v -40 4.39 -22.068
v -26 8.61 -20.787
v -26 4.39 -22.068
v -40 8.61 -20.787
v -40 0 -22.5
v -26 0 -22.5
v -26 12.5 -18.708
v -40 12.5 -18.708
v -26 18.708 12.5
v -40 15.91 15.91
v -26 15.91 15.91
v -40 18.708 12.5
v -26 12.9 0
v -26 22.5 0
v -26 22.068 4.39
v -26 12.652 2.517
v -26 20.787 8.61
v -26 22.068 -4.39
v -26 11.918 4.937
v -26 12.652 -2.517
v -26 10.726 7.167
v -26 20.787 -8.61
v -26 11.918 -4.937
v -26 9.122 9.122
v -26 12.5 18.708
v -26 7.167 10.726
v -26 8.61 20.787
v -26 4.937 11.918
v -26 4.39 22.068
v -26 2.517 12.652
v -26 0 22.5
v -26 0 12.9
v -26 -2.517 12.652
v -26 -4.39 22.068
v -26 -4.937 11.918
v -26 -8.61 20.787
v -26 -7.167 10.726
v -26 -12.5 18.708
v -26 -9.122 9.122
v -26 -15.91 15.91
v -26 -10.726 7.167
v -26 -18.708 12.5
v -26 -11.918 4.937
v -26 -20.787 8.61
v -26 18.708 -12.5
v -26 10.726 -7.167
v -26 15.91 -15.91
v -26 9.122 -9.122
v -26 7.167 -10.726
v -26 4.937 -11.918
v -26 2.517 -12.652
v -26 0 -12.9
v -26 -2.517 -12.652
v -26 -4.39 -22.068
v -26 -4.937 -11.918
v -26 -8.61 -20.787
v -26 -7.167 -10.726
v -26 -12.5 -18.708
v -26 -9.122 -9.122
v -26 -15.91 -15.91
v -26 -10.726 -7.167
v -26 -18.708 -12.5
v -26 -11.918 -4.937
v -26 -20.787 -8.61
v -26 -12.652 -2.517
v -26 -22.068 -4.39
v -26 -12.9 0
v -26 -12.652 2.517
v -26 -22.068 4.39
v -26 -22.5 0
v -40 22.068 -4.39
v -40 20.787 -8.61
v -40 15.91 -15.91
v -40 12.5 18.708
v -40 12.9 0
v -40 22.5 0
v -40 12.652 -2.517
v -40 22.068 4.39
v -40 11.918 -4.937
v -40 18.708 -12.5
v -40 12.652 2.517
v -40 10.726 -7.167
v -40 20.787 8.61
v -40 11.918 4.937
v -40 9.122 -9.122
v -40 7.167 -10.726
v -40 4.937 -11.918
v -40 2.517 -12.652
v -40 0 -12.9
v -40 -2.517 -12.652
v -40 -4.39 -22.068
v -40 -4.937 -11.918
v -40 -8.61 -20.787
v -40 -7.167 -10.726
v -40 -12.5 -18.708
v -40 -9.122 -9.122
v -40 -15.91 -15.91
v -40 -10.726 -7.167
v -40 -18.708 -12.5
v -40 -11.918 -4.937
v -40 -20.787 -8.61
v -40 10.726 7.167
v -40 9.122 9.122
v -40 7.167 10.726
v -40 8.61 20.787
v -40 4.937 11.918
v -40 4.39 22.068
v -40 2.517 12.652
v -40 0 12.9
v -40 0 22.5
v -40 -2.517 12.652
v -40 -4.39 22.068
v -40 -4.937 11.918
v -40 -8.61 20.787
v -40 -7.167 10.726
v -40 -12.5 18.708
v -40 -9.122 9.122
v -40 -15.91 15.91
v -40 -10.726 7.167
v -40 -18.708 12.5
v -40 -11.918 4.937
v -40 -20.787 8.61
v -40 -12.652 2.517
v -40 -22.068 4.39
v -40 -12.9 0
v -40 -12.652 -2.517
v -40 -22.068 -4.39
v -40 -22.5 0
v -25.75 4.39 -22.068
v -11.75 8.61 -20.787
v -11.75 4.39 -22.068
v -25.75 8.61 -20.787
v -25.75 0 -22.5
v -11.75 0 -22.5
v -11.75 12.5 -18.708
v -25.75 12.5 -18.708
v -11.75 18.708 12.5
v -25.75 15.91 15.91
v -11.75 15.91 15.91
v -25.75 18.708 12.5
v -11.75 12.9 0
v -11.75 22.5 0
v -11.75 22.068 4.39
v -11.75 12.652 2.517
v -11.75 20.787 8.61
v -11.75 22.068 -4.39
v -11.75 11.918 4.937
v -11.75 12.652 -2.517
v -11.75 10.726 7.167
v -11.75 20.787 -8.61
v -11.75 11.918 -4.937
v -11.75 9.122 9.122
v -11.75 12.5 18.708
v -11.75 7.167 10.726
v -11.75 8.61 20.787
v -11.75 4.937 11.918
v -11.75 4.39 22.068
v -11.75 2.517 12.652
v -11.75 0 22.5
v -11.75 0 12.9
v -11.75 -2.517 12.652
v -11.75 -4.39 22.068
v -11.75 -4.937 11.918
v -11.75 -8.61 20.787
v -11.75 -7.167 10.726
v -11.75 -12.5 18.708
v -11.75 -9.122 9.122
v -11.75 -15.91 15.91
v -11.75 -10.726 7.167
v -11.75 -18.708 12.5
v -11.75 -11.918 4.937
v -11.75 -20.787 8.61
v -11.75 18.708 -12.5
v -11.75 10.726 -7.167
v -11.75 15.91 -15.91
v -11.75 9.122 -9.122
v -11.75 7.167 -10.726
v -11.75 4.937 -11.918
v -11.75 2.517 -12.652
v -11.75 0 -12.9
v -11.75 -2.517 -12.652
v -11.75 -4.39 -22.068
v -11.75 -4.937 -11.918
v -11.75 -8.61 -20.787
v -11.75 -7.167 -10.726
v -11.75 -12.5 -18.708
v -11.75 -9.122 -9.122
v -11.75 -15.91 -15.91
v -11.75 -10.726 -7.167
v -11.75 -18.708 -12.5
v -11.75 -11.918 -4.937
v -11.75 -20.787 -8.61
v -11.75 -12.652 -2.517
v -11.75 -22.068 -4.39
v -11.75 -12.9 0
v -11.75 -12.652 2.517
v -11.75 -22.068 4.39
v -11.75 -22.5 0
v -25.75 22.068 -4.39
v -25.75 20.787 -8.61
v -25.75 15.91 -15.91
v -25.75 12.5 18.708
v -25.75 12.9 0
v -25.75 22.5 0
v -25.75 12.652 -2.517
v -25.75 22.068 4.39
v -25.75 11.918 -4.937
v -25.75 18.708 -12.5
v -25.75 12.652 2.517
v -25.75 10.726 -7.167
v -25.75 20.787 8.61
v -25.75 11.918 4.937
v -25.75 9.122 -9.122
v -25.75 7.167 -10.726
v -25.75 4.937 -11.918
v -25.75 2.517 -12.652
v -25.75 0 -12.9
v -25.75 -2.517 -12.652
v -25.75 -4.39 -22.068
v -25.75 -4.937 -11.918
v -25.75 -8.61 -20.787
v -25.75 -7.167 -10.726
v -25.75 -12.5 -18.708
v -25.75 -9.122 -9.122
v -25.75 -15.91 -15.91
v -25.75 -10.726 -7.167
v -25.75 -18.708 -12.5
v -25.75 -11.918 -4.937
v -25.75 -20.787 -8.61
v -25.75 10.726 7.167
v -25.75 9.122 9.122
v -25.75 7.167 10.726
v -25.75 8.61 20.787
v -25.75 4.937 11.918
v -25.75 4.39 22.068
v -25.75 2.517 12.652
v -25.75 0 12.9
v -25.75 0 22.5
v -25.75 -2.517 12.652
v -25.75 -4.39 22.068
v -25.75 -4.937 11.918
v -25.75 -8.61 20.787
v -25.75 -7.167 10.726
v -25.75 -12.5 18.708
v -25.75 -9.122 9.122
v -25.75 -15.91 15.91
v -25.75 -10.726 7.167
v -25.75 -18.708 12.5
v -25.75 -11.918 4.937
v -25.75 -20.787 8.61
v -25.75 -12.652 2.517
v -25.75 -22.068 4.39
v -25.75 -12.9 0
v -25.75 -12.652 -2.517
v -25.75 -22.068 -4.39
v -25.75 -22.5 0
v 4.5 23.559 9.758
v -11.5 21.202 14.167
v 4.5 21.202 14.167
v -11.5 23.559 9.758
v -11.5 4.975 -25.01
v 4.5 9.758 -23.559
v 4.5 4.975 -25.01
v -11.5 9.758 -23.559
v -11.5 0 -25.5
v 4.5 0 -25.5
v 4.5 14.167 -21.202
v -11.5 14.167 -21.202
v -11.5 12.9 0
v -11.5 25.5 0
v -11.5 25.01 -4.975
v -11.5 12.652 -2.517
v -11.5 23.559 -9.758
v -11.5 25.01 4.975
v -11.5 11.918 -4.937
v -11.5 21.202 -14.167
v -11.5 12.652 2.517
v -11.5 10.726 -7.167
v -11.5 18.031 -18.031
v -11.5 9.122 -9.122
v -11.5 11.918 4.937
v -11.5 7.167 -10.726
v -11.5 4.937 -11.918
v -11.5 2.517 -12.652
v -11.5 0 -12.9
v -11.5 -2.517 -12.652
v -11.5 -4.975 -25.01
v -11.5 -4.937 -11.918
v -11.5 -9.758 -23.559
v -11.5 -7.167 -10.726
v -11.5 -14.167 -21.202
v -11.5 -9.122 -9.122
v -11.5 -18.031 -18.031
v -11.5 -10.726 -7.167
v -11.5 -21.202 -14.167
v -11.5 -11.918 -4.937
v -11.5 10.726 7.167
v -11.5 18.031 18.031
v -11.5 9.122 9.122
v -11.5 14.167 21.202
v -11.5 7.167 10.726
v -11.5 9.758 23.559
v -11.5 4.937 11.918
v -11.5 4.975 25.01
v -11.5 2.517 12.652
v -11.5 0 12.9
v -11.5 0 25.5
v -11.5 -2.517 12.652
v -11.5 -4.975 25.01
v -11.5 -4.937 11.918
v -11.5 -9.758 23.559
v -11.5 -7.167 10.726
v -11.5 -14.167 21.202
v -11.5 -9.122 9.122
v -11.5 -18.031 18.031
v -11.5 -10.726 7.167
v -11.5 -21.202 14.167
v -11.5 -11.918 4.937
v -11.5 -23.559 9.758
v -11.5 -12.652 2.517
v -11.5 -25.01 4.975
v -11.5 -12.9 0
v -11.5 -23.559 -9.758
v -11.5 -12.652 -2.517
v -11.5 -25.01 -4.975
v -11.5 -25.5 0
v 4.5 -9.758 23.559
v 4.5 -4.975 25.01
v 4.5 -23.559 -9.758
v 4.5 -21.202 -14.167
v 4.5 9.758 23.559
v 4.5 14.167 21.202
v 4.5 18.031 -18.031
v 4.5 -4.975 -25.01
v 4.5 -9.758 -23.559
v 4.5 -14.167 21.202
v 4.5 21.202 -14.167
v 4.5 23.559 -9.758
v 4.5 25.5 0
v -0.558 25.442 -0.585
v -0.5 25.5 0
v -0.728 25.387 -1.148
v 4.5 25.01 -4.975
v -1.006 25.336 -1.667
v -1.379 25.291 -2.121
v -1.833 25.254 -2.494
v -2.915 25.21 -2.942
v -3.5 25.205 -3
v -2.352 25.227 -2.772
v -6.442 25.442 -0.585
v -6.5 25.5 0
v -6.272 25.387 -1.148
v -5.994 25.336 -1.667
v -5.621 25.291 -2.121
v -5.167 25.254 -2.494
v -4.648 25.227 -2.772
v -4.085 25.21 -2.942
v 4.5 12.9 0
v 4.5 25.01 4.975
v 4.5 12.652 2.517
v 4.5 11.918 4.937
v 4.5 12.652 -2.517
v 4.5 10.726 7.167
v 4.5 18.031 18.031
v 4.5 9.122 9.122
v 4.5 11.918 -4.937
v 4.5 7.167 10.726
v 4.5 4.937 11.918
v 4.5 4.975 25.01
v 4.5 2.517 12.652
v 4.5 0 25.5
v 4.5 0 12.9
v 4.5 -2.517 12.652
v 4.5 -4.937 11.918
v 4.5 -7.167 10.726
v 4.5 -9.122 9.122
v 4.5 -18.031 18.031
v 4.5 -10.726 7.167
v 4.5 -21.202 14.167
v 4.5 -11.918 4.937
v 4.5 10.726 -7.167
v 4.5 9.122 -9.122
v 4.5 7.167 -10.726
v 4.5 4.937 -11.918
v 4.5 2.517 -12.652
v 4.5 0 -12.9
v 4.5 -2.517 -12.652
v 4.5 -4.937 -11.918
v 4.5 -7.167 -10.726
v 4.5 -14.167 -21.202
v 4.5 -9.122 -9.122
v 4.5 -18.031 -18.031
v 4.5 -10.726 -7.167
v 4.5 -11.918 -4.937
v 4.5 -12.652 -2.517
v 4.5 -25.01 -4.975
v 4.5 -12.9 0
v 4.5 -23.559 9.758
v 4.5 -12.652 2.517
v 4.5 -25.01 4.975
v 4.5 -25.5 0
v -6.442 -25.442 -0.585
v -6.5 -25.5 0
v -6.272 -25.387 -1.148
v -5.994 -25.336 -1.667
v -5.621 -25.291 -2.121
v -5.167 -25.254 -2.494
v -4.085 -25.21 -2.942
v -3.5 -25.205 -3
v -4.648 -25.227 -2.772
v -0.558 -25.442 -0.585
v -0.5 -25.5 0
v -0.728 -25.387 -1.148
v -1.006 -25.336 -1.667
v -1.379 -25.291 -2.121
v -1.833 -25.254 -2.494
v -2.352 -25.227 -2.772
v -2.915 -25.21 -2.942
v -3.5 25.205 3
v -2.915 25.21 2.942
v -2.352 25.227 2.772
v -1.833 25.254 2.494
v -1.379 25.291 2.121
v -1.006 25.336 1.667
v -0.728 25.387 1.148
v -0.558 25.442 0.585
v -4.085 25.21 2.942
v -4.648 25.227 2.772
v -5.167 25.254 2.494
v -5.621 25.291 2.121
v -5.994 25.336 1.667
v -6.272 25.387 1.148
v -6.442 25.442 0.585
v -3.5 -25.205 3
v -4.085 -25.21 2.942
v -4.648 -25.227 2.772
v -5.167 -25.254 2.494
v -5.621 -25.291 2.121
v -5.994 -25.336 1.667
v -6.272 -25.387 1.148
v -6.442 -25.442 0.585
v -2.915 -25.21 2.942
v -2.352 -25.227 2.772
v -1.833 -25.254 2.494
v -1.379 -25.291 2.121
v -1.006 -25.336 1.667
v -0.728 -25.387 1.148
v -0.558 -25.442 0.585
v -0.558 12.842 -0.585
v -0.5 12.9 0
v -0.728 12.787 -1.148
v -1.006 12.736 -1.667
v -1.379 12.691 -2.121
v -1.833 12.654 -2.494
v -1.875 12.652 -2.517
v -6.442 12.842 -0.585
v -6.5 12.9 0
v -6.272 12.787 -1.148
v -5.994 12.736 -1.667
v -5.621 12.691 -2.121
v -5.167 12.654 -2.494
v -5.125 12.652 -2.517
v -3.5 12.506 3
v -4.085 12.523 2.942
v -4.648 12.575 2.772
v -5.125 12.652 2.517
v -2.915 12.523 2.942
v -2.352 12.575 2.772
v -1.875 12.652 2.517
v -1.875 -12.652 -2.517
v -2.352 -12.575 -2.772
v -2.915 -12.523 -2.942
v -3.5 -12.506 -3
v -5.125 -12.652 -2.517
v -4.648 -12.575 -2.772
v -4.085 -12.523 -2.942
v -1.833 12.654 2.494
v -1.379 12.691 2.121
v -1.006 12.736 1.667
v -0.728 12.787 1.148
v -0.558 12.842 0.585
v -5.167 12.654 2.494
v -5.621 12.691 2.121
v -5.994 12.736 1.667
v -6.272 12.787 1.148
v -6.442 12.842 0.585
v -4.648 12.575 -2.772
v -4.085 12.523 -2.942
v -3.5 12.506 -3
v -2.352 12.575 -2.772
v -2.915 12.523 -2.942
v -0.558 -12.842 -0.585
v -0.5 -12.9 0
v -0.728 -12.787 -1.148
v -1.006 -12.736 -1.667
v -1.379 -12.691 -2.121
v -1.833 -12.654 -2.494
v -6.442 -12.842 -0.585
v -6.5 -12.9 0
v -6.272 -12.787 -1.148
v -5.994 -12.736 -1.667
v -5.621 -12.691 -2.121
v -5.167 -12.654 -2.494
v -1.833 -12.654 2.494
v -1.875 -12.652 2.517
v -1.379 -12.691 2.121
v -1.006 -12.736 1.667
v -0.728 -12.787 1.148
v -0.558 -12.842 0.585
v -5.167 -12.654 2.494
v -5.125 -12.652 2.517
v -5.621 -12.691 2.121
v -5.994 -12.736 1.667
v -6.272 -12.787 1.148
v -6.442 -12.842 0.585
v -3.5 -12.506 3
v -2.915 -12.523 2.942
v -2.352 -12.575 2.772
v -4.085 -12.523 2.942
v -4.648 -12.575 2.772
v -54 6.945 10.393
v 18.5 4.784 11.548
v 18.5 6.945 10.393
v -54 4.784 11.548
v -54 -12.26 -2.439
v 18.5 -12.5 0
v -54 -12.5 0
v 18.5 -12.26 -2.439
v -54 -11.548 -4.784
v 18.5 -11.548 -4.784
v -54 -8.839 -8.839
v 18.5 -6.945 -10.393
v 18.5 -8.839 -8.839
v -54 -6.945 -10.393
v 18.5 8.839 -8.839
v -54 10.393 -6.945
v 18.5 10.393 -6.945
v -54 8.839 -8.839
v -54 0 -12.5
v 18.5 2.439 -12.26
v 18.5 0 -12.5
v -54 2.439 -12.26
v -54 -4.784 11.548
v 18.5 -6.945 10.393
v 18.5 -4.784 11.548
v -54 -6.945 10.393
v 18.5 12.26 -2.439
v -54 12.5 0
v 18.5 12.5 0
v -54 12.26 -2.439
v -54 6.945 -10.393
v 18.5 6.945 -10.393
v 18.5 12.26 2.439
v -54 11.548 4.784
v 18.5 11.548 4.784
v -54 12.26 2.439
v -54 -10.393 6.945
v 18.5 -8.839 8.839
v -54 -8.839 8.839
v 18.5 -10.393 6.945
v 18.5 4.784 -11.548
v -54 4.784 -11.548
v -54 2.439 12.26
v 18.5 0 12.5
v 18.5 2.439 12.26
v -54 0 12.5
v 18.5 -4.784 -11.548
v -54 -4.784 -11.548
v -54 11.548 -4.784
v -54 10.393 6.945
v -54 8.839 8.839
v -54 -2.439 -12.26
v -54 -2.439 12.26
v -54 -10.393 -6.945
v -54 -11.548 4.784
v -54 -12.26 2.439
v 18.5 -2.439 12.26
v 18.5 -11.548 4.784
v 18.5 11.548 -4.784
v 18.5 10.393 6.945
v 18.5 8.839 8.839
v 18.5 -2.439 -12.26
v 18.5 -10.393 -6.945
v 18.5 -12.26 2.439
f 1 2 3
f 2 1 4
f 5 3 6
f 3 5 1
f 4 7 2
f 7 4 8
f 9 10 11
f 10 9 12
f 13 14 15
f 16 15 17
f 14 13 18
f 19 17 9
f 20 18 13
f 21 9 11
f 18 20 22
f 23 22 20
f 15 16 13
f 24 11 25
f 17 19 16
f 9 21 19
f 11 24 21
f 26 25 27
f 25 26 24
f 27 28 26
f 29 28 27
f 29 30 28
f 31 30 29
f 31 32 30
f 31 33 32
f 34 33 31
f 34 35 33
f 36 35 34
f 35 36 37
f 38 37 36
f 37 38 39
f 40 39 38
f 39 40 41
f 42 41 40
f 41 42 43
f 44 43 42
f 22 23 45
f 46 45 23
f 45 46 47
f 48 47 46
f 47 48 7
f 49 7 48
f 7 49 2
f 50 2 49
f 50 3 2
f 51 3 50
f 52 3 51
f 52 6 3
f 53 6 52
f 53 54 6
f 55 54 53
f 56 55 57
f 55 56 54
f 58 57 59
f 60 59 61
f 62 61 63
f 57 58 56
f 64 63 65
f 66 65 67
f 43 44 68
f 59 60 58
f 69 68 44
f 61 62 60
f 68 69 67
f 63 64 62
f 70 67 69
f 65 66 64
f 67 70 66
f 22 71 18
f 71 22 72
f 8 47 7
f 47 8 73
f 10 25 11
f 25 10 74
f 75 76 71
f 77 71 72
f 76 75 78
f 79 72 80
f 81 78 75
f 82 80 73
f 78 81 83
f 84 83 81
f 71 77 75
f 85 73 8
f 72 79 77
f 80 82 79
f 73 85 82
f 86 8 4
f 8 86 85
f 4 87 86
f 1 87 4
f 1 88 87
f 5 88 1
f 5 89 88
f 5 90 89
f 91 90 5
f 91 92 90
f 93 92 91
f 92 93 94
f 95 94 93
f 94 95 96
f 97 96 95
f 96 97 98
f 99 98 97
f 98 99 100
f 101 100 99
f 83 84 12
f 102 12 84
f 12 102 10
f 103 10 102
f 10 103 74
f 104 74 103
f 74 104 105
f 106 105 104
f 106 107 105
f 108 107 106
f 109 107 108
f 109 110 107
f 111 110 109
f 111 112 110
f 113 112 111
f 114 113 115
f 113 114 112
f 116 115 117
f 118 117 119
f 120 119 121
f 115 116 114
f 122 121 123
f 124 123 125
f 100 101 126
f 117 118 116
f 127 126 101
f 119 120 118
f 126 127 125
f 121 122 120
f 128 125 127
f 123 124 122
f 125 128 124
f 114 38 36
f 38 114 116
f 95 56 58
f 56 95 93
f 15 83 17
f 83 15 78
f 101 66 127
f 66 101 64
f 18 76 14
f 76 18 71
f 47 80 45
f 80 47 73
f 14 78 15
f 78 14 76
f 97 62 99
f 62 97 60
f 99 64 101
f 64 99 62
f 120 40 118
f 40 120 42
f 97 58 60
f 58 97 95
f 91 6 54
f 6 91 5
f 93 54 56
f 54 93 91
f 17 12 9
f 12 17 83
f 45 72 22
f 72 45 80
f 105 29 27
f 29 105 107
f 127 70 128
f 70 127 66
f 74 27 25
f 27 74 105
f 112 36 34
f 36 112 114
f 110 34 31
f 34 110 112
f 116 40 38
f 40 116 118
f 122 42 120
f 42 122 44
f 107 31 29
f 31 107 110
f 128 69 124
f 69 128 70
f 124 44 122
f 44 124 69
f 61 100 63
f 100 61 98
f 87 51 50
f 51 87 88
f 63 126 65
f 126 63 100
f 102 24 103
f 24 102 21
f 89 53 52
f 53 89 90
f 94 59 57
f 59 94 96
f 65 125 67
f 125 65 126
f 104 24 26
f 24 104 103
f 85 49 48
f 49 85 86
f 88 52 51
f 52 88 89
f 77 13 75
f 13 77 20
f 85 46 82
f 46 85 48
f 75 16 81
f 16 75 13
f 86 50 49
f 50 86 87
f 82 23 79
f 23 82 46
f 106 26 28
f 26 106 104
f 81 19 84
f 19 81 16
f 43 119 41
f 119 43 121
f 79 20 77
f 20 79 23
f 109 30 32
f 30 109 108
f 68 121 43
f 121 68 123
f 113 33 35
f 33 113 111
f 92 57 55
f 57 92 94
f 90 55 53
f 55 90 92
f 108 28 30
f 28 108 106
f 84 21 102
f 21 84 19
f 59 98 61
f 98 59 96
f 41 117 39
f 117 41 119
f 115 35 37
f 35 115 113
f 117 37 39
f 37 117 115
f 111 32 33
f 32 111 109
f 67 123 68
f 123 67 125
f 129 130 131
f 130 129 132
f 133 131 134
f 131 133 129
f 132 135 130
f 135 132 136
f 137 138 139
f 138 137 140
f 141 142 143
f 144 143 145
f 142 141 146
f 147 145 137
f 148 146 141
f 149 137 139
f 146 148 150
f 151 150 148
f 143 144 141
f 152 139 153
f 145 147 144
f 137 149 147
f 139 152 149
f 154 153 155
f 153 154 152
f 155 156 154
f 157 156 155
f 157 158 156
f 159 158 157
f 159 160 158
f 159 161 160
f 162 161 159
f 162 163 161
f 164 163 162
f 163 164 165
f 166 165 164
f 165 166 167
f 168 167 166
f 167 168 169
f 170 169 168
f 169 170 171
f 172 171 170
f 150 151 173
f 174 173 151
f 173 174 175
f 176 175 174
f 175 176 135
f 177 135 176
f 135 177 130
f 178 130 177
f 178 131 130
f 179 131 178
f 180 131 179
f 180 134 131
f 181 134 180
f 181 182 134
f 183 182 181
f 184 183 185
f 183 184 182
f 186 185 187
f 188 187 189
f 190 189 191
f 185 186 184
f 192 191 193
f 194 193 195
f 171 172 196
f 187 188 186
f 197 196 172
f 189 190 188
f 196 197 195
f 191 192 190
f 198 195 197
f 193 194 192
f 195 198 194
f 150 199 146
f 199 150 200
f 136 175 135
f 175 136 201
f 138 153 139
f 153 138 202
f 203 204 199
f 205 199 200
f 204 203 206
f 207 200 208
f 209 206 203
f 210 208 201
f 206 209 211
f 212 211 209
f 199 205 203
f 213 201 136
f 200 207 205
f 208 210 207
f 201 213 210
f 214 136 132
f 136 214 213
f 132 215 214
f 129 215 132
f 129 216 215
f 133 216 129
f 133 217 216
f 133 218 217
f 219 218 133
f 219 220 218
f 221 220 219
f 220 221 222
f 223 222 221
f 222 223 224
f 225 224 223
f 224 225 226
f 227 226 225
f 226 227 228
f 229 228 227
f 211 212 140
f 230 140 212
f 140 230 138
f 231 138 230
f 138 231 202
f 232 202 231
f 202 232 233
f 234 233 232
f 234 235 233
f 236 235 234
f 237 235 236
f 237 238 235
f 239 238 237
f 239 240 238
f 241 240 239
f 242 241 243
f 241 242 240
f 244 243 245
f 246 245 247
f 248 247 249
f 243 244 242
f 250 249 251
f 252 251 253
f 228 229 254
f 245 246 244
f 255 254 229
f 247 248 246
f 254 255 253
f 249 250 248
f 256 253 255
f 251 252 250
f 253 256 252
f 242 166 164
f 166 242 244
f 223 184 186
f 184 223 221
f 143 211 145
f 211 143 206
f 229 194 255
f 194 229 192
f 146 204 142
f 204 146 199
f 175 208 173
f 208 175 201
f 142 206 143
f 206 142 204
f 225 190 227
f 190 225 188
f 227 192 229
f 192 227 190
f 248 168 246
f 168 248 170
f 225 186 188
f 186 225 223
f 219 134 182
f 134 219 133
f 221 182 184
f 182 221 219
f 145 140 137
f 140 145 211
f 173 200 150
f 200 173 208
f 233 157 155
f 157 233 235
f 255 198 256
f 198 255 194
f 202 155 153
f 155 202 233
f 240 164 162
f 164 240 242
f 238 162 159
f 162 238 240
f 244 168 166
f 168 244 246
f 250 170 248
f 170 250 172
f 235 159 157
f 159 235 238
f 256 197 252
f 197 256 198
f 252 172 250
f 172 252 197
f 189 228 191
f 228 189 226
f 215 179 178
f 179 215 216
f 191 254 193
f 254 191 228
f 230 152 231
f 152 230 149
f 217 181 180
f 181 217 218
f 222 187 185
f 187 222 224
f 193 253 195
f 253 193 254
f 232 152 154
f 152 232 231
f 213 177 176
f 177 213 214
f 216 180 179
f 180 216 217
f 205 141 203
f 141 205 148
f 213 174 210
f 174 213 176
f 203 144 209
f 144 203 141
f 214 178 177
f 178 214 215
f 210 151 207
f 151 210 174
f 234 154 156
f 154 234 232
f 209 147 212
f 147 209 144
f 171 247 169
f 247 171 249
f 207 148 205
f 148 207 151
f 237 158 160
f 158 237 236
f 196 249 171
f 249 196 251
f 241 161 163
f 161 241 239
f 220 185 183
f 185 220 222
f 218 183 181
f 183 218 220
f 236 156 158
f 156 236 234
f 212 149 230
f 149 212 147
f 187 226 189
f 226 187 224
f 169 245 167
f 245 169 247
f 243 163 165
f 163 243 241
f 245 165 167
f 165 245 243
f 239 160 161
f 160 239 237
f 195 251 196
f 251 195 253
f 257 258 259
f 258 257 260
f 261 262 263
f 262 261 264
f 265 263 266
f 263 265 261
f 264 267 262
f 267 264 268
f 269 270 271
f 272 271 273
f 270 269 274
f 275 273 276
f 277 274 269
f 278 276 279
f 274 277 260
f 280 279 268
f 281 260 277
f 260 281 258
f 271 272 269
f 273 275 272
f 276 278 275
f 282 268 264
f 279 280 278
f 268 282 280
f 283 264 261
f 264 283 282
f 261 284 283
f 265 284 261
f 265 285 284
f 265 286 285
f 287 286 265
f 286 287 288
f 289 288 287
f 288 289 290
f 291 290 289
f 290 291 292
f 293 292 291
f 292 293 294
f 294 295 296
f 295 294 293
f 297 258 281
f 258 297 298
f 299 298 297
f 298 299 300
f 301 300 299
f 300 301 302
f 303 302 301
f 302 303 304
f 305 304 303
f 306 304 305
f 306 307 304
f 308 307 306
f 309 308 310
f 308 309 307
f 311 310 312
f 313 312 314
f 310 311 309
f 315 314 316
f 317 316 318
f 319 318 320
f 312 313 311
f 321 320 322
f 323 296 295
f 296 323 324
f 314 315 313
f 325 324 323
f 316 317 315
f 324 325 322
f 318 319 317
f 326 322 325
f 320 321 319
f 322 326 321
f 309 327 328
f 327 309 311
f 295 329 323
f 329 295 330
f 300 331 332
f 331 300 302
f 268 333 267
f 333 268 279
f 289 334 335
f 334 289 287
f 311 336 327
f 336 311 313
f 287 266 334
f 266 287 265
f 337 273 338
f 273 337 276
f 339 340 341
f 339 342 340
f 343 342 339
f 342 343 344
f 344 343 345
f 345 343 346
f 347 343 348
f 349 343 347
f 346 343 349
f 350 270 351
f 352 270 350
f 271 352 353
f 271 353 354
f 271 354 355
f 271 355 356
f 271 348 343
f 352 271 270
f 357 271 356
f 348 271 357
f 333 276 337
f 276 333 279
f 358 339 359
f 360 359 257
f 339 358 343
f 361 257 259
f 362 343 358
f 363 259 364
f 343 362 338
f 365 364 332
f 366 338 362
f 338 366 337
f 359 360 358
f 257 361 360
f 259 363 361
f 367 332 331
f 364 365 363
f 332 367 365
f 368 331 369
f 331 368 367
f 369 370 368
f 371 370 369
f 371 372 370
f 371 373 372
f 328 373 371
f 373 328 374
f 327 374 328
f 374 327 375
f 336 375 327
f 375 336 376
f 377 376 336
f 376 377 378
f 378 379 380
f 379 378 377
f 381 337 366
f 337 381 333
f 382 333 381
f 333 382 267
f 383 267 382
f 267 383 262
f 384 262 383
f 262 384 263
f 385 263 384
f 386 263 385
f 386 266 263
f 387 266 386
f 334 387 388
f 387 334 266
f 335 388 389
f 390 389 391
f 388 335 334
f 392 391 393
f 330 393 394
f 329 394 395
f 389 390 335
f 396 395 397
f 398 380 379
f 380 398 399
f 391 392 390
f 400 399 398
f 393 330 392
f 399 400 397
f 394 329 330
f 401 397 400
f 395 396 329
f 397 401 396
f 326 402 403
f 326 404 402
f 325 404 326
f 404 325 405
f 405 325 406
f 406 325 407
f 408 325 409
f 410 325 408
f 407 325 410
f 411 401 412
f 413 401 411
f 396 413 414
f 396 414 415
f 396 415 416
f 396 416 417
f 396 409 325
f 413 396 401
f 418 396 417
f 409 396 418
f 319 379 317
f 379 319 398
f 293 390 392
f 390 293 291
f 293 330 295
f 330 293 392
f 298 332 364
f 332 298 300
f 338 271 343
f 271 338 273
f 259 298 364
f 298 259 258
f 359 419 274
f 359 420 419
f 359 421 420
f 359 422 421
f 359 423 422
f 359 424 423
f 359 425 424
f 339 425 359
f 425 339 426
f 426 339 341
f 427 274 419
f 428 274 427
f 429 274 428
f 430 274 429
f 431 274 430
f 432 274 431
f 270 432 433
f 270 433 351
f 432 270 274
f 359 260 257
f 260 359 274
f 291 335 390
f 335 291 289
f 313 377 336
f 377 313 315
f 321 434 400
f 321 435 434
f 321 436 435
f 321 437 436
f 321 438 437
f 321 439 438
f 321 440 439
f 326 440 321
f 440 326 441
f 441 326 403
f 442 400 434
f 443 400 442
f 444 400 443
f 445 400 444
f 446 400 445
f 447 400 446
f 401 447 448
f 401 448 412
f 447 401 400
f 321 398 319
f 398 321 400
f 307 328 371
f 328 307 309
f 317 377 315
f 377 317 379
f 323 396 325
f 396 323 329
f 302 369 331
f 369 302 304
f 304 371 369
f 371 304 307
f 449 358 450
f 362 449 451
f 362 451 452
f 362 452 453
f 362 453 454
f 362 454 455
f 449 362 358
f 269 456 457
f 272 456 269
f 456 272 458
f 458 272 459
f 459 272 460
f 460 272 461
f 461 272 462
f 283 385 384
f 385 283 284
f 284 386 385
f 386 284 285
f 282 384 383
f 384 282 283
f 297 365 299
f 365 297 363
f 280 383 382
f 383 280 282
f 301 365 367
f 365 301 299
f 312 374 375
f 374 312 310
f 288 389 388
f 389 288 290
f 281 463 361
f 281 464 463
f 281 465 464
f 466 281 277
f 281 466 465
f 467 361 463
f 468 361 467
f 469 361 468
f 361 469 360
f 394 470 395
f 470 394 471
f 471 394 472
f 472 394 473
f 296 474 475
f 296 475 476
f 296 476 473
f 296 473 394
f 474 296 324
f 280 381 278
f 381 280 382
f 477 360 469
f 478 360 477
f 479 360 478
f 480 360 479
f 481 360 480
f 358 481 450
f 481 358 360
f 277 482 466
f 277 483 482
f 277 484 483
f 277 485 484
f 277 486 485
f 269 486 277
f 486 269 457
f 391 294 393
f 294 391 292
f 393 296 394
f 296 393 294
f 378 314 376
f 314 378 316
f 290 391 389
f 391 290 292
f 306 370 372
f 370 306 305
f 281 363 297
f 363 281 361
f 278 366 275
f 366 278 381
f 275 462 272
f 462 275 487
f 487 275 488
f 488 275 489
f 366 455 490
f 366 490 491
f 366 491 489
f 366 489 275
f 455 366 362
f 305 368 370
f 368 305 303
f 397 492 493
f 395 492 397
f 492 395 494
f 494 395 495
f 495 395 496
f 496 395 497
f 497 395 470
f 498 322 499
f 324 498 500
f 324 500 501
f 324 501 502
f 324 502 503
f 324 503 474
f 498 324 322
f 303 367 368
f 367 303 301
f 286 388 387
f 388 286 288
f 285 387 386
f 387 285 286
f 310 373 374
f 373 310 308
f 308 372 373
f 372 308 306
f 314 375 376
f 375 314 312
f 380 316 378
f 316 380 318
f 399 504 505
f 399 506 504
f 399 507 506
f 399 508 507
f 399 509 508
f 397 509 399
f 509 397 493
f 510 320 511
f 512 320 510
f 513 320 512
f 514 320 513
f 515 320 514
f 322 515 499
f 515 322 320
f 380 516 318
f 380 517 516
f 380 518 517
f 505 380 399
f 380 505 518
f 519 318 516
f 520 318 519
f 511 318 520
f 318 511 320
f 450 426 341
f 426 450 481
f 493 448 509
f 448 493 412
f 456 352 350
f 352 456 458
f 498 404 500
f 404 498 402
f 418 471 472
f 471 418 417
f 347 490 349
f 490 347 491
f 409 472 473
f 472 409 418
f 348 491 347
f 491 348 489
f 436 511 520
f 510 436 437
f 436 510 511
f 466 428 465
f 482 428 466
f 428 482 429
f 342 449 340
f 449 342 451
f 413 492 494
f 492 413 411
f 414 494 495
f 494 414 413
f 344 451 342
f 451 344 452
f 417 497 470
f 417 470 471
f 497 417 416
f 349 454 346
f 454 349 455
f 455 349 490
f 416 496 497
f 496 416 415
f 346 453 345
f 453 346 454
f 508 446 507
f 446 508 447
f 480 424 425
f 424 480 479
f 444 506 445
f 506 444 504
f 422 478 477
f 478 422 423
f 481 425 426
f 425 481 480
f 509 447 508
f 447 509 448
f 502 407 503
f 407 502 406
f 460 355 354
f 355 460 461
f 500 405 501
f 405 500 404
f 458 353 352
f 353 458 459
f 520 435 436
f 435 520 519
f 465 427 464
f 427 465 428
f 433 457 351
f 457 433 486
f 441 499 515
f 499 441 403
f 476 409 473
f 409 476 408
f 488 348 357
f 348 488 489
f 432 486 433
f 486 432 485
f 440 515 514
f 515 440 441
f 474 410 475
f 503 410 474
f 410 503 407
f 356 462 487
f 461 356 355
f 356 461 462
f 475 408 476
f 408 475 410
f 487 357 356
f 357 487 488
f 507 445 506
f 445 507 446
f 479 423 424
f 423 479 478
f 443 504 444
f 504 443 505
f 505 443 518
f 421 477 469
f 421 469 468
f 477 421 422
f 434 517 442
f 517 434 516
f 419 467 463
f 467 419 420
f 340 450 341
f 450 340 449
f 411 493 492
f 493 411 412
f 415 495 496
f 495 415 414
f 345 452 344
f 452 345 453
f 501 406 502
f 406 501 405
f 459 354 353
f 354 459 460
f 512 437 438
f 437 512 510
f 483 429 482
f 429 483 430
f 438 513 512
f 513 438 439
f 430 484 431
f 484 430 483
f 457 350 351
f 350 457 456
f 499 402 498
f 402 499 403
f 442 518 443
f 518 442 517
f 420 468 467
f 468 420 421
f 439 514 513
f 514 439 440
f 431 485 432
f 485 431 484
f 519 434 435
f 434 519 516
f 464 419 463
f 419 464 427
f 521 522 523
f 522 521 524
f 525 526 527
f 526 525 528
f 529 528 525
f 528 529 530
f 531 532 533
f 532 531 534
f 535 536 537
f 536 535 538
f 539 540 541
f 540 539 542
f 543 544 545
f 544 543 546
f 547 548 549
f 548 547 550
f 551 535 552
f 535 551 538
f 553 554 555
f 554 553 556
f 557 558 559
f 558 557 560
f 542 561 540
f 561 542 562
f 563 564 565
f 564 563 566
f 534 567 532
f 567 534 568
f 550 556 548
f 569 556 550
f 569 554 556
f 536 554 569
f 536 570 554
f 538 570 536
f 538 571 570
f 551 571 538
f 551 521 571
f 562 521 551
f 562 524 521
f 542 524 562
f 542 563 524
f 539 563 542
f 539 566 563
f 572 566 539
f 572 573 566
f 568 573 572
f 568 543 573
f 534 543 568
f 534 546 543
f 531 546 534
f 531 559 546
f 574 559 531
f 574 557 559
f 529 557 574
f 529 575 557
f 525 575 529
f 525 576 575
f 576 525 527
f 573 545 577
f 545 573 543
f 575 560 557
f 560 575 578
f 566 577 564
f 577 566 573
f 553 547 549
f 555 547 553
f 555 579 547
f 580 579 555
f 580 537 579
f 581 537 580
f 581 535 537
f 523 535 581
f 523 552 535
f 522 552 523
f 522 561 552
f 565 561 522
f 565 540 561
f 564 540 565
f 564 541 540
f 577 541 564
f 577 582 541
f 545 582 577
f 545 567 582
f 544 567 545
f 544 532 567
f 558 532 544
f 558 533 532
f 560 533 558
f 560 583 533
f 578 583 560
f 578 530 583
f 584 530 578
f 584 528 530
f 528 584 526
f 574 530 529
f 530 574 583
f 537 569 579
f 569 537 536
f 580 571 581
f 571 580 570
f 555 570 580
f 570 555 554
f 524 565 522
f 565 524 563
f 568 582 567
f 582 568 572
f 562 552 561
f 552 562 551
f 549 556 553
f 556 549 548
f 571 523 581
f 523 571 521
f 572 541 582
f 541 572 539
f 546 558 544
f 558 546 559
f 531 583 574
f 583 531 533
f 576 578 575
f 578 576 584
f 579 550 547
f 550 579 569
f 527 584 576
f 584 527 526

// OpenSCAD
$fn = 32;

// ------------------------------------------------------------------------
// Shaft with rings and collars: d25 shaft, 3 rings
// Every part is its own module, assembly() places them once.
// ------------------------------------------------------------------------

// --- part 1 ---
module shaft() {
  translate([0, 0, -36.25]) cylinder(h = 72.5, d = 25);
}

// --- part 2 ---
module spacer_a() {
  difference() {
      translate([0, 0, 0]) cylinder(h = 14, d = 45);
      translate([0, 0, -1]) cylinder(h = 16, d = 25.8);
    }
}

// --- part 3 ---
module spacer_b() {
  difference() {
      translate([0, 0, 0]) cylinder(h = 14, d = 45);
      translate([0, 0, -1]) cylinder(h = 16, d = 25.8);
    }
}

// --- part 4 ---
module collar_a() {
  difference() {
    cylinder(h = 16, d = 51);
    translate([0, 0, -1]) cylinder(h = 18, d = 25.8);
    translate([0, 0, 8]) rotate([90, 0, 0]) cylinder(h = 53, d = 6, center = true);
  }
}

// --- assembly ---
module assembly() {
  translate([-17.75, 0, 0]) rotate([0, 90, 0]) shaft();
  translate([-40, 0, 0]) rotate([0, 90, 0]) spacer_a();
  translate([-25.75, 0, 0]) rotate([0, 90, 0]) spacer_b();
  translate([-11.5, 0, 0]) rotate([0, 90, 0]) collar_a();
}

assembly();
